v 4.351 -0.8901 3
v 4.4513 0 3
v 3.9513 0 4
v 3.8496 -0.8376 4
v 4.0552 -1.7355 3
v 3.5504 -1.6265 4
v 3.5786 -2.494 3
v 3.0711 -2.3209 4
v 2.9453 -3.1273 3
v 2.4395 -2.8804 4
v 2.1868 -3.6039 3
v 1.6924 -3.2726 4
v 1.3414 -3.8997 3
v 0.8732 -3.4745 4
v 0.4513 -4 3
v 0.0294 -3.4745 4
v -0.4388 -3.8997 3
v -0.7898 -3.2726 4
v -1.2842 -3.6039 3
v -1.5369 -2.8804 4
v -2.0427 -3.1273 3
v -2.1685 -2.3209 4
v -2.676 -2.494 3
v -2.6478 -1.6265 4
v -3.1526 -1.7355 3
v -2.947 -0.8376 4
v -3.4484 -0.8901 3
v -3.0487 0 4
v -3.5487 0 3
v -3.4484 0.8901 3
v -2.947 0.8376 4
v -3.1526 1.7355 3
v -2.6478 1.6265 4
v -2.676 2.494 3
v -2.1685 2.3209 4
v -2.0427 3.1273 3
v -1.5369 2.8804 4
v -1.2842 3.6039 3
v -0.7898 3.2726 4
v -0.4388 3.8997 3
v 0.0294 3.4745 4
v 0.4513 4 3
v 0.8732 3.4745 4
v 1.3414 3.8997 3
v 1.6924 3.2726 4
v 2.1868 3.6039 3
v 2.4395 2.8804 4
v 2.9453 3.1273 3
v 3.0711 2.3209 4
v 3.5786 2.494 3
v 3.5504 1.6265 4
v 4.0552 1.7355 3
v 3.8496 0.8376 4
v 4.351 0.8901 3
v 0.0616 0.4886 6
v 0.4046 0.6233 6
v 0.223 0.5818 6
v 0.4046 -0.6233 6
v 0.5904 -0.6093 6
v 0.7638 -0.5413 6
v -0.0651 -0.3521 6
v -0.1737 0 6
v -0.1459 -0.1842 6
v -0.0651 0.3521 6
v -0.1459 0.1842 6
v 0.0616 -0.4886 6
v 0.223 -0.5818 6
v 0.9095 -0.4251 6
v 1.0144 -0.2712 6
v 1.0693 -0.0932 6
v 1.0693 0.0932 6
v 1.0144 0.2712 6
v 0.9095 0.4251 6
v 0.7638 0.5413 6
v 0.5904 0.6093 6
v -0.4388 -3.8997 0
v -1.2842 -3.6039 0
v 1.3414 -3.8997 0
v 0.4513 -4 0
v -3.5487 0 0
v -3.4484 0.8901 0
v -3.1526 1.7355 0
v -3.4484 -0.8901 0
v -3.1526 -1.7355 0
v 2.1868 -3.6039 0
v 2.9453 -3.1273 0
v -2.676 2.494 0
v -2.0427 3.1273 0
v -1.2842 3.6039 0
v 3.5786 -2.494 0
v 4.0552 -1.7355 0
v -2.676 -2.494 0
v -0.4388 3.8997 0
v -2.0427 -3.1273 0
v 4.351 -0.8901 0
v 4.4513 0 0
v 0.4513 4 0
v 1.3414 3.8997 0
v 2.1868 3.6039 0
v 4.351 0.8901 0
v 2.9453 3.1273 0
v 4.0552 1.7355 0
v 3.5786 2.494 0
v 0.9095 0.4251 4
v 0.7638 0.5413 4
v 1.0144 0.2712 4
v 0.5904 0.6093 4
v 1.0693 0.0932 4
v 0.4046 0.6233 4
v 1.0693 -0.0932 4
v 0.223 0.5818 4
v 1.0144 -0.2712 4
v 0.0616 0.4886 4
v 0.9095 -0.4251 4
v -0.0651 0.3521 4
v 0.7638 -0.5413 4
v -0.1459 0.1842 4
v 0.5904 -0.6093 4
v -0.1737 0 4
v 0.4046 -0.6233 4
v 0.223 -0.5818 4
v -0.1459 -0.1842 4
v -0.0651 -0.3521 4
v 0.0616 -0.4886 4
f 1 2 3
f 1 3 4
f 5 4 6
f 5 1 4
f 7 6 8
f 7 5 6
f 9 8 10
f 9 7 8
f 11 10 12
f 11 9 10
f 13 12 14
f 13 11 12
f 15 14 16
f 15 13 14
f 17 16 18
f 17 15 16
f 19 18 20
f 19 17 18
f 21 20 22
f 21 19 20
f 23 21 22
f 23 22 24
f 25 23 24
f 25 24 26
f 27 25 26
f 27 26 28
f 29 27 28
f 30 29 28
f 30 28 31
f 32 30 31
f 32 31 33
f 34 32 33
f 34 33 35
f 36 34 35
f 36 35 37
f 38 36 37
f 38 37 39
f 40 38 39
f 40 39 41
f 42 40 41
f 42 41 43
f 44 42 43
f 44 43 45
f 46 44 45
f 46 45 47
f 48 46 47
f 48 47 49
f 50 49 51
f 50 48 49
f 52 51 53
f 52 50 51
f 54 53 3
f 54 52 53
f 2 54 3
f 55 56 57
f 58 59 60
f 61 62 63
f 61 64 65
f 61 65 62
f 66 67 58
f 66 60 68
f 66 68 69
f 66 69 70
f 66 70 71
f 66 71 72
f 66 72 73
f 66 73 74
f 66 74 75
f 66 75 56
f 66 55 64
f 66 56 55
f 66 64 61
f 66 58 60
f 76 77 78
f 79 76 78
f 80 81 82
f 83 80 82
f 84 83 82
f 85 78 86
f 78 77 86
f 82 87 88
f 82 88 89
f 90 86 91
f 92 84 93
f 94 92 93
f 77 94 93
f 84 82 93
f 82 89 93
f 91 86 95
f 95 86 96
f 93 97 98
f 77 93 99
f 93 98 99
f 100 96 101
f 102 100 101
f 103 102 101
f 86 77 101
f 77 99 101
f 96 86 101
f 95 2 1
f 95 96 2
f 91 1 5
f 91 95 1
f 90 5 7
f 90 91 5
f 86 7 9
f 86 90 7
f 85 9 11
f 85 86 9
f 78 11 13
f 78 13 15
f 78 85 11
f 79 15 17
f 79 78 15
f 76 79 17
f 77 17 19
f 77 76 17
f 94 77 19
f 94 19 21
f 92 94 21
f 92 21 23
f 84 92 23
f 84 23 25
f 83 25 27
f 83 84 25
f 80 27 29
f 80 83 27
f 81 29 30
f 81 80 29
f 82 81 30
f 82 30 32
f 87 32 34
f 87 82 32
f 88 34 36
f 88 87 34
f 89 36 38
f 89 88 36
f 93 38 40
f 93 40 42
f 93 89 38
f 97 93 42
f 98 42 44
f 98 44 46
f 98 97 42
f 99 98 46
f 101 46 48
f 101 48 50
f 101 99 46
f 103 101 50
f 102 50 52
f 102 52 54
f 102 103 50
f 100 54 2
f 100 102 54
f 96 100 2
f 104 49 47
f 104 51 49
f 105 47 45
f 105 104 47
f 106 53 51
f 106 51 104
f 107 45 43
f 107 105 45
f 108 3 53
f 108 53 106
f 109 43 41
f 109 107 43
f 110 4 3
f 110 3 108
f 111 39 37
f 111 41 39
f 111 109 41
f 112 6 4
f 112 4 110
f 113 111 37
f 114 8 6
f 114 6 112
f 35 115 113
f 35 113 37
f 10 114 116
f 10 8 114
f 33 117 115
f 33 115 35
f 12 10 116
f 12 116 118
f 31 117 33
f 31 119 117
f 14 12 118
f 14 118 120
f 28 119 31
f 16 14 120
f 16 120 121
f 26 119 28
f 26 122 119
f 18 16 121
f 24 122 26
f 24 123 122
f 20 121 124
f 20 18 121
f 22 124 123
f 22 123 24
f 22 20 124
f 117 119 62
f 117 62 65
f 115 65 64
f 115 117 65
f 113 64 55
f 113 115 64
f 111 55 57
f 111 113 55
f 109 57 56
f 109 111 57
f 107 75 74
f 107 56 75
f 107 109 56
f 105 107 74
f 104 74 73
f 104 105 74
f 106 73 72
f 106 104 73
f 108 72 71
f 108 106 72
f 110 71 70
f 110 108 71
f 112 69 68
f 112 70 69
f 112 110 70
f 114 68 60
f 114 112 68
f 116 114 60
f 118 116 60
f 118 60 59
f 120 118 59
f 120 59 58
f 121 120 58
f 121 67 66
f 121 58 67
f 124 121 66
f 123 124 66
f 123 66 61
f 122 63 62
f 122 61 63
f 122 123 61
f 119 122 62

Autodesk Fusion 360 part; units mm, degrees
sketch "Sketch1" plane through (0, 0, 0) normal (0, 0, 1) x (1, 0, 0)
  circle A0 centre (0.4513, 0) radius 4
  dimension "d1" = 8
extrude "Extrude1" add sketch "Sketch1" along normal blind 4
sketch "Sketch2" plane through (0, 0, 4) normal (0, 0, 1) x (-1, 0, 0)
  circle A0 centre (-0.4513, 0) radius 4
  circle A1 centre (-0.4513, 0) radius 3.5
  circle A2 centre (-0.4513, 0) radius 0.625
  dimension "d4" = 7
  dimension "d5" = 1.25
extrude "Extrude2" cut 1 faces at (2.3843, -0.8657, 4) along direction (0, 0, -1) blind 1
loft "Loft1" add profiles "Sketch2" section 1 face at (2.3843, -0.8657, 3) section 2 contours A1
extrude "Extrude3" add sketch "Sketch2" along normal blind 2 contours A2
